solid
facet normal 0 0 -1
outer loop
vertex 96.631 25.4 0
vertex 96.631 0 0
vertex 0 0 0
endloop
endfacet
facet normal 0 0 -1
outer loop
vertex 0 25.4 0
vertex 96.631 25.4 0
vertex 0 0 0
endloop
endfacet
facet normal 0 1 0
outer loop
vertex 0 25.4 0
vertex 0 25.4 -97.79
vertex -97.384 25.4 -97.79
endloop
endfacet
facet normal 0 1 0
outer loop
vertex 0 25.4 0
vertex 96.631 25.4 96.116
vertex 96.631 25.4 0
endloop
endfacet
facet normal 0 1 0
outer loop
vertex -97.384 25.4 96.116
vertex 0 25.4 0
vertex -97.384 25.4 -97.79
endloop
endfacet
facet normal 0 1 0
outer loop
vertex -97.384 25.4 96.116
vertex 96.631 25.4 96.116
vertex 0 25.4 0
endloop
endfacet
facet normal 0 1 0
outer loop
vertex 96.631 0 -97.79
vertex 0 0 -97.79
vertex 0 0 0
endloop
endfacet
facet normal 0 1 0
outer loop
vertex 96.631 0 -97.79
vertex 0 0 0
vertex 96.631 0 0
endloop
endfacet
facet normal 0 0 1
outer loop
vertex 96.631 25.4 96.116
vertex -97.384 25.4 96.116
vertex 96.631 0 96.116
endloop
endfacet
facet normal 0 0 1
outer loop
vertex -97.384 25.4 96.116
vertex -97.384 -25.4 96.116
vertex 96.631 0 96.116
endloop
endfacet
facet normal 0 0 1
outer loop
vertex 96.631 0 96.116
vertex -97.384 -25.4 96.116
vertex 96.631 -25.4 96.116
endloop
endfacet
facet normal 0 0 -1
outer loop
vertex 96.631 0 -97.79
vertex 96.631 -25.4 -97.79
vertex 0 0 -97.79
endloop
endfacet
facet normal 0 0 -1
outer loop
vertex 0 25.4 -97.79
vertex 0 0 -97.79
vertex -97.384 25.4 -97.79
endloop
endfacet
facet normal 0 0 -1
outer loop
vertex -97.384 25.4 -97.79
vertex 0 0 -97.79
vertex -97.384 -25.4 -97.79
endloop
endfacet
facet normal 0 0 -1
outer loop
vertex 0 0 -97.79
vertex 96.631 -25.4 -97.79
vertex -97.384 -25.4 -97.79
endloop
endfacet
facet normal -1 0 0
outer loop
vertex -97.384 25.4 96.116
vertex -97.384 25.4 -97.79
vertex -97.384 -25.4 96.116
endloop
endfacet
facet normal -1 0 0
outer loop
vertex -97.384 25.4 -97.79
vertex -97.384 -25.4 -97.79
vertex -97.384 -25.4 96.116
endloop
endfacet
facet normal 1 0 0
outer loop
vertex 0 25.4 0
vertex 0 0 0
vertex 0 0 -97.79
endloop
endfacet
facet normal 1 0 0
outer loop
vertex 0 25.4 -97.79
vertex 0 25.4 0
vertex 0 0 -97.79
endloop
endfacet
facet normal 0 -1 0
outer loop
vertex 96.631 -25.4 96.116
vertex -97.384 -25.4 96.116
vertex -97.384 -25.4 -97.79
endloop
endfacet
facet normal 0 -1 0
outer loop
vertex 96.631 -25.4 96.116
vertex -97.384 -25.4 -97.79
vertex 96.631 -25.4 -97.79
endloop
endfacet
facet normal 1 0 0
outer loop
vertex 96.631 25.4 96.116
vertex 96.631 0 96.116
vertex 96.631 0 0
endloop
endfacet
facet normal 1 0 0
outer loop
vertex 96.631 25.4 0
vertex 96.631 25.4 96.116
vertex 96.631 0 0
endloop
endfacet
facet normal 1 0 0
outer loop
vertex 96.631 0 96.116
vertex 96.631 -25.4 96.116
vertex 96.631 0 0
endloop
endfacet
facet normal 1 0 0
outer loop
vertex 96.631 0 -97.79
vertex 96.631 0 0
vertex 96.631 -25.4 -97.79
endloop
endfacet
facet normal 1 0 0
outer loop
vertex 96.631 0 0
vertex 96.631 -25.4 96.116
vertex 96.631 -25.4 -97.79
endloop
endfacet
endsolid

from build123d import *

# Parameters (mm, degrees)
F0_W     = 194.0150633454
F0_H     = 193.9053460956
F1_DEPTH = 25.4
F2_W     = 76.4794424176
F2_H     = 75.5990371108
F2_H_2   = 76.2040093541
F2_W_2   = 74.5813548565
F3_DEPTH = 25.4


with BuildPart() as f1:
    # F0 (on Front) → F1 (new body)
    with BuildSketch(Plane.XZ):
        with Locations((-0.3764815629, -0.8369870484)):
            Rectangle(F0_W, F0_H)
    extrude(amount=F1_DEPTH)

    # F2 (on face) → F3 (join)
    with BuildSketch(Plane(origin=(0, 0, 0), x_dir=(-1, 0, 0), z_dir=(0, 1, 0))):
        with Locations((38.2397212088, 37.7995185554)):
            Rectangle(F2_W, F2_H)
        with Locations((38.2397212088, -38.1020046771)):
            Rectangle(F2_W, F2_H_2)
        with Locations((-37.2906774282, 37.7995185554)):
            Rectangle(F2_W_2, F2_H)
        Polygon((97.3840132356, 0), (76.4794424176, 0), (76.4794424176, -76.2040093541), (0, -76.2040093541), (0, -97.7896600962), (97.3840132356, -97.7896600962), align=None)
        Polygon((76.4794424176, 75.5990371108), (76.4794424176, 0), (97.3840132356, 0), (97.3840132356, 96.1156859994), (-96.6310501099, 96.1156859994), (-96.6310501099, 0), (-74.5813548565, 0), (-74.5813548565, 75.5990371108), (0, 75.5990371108), align=None)
    extrude(amount=F3_DEPTH)


solid = f1.part
